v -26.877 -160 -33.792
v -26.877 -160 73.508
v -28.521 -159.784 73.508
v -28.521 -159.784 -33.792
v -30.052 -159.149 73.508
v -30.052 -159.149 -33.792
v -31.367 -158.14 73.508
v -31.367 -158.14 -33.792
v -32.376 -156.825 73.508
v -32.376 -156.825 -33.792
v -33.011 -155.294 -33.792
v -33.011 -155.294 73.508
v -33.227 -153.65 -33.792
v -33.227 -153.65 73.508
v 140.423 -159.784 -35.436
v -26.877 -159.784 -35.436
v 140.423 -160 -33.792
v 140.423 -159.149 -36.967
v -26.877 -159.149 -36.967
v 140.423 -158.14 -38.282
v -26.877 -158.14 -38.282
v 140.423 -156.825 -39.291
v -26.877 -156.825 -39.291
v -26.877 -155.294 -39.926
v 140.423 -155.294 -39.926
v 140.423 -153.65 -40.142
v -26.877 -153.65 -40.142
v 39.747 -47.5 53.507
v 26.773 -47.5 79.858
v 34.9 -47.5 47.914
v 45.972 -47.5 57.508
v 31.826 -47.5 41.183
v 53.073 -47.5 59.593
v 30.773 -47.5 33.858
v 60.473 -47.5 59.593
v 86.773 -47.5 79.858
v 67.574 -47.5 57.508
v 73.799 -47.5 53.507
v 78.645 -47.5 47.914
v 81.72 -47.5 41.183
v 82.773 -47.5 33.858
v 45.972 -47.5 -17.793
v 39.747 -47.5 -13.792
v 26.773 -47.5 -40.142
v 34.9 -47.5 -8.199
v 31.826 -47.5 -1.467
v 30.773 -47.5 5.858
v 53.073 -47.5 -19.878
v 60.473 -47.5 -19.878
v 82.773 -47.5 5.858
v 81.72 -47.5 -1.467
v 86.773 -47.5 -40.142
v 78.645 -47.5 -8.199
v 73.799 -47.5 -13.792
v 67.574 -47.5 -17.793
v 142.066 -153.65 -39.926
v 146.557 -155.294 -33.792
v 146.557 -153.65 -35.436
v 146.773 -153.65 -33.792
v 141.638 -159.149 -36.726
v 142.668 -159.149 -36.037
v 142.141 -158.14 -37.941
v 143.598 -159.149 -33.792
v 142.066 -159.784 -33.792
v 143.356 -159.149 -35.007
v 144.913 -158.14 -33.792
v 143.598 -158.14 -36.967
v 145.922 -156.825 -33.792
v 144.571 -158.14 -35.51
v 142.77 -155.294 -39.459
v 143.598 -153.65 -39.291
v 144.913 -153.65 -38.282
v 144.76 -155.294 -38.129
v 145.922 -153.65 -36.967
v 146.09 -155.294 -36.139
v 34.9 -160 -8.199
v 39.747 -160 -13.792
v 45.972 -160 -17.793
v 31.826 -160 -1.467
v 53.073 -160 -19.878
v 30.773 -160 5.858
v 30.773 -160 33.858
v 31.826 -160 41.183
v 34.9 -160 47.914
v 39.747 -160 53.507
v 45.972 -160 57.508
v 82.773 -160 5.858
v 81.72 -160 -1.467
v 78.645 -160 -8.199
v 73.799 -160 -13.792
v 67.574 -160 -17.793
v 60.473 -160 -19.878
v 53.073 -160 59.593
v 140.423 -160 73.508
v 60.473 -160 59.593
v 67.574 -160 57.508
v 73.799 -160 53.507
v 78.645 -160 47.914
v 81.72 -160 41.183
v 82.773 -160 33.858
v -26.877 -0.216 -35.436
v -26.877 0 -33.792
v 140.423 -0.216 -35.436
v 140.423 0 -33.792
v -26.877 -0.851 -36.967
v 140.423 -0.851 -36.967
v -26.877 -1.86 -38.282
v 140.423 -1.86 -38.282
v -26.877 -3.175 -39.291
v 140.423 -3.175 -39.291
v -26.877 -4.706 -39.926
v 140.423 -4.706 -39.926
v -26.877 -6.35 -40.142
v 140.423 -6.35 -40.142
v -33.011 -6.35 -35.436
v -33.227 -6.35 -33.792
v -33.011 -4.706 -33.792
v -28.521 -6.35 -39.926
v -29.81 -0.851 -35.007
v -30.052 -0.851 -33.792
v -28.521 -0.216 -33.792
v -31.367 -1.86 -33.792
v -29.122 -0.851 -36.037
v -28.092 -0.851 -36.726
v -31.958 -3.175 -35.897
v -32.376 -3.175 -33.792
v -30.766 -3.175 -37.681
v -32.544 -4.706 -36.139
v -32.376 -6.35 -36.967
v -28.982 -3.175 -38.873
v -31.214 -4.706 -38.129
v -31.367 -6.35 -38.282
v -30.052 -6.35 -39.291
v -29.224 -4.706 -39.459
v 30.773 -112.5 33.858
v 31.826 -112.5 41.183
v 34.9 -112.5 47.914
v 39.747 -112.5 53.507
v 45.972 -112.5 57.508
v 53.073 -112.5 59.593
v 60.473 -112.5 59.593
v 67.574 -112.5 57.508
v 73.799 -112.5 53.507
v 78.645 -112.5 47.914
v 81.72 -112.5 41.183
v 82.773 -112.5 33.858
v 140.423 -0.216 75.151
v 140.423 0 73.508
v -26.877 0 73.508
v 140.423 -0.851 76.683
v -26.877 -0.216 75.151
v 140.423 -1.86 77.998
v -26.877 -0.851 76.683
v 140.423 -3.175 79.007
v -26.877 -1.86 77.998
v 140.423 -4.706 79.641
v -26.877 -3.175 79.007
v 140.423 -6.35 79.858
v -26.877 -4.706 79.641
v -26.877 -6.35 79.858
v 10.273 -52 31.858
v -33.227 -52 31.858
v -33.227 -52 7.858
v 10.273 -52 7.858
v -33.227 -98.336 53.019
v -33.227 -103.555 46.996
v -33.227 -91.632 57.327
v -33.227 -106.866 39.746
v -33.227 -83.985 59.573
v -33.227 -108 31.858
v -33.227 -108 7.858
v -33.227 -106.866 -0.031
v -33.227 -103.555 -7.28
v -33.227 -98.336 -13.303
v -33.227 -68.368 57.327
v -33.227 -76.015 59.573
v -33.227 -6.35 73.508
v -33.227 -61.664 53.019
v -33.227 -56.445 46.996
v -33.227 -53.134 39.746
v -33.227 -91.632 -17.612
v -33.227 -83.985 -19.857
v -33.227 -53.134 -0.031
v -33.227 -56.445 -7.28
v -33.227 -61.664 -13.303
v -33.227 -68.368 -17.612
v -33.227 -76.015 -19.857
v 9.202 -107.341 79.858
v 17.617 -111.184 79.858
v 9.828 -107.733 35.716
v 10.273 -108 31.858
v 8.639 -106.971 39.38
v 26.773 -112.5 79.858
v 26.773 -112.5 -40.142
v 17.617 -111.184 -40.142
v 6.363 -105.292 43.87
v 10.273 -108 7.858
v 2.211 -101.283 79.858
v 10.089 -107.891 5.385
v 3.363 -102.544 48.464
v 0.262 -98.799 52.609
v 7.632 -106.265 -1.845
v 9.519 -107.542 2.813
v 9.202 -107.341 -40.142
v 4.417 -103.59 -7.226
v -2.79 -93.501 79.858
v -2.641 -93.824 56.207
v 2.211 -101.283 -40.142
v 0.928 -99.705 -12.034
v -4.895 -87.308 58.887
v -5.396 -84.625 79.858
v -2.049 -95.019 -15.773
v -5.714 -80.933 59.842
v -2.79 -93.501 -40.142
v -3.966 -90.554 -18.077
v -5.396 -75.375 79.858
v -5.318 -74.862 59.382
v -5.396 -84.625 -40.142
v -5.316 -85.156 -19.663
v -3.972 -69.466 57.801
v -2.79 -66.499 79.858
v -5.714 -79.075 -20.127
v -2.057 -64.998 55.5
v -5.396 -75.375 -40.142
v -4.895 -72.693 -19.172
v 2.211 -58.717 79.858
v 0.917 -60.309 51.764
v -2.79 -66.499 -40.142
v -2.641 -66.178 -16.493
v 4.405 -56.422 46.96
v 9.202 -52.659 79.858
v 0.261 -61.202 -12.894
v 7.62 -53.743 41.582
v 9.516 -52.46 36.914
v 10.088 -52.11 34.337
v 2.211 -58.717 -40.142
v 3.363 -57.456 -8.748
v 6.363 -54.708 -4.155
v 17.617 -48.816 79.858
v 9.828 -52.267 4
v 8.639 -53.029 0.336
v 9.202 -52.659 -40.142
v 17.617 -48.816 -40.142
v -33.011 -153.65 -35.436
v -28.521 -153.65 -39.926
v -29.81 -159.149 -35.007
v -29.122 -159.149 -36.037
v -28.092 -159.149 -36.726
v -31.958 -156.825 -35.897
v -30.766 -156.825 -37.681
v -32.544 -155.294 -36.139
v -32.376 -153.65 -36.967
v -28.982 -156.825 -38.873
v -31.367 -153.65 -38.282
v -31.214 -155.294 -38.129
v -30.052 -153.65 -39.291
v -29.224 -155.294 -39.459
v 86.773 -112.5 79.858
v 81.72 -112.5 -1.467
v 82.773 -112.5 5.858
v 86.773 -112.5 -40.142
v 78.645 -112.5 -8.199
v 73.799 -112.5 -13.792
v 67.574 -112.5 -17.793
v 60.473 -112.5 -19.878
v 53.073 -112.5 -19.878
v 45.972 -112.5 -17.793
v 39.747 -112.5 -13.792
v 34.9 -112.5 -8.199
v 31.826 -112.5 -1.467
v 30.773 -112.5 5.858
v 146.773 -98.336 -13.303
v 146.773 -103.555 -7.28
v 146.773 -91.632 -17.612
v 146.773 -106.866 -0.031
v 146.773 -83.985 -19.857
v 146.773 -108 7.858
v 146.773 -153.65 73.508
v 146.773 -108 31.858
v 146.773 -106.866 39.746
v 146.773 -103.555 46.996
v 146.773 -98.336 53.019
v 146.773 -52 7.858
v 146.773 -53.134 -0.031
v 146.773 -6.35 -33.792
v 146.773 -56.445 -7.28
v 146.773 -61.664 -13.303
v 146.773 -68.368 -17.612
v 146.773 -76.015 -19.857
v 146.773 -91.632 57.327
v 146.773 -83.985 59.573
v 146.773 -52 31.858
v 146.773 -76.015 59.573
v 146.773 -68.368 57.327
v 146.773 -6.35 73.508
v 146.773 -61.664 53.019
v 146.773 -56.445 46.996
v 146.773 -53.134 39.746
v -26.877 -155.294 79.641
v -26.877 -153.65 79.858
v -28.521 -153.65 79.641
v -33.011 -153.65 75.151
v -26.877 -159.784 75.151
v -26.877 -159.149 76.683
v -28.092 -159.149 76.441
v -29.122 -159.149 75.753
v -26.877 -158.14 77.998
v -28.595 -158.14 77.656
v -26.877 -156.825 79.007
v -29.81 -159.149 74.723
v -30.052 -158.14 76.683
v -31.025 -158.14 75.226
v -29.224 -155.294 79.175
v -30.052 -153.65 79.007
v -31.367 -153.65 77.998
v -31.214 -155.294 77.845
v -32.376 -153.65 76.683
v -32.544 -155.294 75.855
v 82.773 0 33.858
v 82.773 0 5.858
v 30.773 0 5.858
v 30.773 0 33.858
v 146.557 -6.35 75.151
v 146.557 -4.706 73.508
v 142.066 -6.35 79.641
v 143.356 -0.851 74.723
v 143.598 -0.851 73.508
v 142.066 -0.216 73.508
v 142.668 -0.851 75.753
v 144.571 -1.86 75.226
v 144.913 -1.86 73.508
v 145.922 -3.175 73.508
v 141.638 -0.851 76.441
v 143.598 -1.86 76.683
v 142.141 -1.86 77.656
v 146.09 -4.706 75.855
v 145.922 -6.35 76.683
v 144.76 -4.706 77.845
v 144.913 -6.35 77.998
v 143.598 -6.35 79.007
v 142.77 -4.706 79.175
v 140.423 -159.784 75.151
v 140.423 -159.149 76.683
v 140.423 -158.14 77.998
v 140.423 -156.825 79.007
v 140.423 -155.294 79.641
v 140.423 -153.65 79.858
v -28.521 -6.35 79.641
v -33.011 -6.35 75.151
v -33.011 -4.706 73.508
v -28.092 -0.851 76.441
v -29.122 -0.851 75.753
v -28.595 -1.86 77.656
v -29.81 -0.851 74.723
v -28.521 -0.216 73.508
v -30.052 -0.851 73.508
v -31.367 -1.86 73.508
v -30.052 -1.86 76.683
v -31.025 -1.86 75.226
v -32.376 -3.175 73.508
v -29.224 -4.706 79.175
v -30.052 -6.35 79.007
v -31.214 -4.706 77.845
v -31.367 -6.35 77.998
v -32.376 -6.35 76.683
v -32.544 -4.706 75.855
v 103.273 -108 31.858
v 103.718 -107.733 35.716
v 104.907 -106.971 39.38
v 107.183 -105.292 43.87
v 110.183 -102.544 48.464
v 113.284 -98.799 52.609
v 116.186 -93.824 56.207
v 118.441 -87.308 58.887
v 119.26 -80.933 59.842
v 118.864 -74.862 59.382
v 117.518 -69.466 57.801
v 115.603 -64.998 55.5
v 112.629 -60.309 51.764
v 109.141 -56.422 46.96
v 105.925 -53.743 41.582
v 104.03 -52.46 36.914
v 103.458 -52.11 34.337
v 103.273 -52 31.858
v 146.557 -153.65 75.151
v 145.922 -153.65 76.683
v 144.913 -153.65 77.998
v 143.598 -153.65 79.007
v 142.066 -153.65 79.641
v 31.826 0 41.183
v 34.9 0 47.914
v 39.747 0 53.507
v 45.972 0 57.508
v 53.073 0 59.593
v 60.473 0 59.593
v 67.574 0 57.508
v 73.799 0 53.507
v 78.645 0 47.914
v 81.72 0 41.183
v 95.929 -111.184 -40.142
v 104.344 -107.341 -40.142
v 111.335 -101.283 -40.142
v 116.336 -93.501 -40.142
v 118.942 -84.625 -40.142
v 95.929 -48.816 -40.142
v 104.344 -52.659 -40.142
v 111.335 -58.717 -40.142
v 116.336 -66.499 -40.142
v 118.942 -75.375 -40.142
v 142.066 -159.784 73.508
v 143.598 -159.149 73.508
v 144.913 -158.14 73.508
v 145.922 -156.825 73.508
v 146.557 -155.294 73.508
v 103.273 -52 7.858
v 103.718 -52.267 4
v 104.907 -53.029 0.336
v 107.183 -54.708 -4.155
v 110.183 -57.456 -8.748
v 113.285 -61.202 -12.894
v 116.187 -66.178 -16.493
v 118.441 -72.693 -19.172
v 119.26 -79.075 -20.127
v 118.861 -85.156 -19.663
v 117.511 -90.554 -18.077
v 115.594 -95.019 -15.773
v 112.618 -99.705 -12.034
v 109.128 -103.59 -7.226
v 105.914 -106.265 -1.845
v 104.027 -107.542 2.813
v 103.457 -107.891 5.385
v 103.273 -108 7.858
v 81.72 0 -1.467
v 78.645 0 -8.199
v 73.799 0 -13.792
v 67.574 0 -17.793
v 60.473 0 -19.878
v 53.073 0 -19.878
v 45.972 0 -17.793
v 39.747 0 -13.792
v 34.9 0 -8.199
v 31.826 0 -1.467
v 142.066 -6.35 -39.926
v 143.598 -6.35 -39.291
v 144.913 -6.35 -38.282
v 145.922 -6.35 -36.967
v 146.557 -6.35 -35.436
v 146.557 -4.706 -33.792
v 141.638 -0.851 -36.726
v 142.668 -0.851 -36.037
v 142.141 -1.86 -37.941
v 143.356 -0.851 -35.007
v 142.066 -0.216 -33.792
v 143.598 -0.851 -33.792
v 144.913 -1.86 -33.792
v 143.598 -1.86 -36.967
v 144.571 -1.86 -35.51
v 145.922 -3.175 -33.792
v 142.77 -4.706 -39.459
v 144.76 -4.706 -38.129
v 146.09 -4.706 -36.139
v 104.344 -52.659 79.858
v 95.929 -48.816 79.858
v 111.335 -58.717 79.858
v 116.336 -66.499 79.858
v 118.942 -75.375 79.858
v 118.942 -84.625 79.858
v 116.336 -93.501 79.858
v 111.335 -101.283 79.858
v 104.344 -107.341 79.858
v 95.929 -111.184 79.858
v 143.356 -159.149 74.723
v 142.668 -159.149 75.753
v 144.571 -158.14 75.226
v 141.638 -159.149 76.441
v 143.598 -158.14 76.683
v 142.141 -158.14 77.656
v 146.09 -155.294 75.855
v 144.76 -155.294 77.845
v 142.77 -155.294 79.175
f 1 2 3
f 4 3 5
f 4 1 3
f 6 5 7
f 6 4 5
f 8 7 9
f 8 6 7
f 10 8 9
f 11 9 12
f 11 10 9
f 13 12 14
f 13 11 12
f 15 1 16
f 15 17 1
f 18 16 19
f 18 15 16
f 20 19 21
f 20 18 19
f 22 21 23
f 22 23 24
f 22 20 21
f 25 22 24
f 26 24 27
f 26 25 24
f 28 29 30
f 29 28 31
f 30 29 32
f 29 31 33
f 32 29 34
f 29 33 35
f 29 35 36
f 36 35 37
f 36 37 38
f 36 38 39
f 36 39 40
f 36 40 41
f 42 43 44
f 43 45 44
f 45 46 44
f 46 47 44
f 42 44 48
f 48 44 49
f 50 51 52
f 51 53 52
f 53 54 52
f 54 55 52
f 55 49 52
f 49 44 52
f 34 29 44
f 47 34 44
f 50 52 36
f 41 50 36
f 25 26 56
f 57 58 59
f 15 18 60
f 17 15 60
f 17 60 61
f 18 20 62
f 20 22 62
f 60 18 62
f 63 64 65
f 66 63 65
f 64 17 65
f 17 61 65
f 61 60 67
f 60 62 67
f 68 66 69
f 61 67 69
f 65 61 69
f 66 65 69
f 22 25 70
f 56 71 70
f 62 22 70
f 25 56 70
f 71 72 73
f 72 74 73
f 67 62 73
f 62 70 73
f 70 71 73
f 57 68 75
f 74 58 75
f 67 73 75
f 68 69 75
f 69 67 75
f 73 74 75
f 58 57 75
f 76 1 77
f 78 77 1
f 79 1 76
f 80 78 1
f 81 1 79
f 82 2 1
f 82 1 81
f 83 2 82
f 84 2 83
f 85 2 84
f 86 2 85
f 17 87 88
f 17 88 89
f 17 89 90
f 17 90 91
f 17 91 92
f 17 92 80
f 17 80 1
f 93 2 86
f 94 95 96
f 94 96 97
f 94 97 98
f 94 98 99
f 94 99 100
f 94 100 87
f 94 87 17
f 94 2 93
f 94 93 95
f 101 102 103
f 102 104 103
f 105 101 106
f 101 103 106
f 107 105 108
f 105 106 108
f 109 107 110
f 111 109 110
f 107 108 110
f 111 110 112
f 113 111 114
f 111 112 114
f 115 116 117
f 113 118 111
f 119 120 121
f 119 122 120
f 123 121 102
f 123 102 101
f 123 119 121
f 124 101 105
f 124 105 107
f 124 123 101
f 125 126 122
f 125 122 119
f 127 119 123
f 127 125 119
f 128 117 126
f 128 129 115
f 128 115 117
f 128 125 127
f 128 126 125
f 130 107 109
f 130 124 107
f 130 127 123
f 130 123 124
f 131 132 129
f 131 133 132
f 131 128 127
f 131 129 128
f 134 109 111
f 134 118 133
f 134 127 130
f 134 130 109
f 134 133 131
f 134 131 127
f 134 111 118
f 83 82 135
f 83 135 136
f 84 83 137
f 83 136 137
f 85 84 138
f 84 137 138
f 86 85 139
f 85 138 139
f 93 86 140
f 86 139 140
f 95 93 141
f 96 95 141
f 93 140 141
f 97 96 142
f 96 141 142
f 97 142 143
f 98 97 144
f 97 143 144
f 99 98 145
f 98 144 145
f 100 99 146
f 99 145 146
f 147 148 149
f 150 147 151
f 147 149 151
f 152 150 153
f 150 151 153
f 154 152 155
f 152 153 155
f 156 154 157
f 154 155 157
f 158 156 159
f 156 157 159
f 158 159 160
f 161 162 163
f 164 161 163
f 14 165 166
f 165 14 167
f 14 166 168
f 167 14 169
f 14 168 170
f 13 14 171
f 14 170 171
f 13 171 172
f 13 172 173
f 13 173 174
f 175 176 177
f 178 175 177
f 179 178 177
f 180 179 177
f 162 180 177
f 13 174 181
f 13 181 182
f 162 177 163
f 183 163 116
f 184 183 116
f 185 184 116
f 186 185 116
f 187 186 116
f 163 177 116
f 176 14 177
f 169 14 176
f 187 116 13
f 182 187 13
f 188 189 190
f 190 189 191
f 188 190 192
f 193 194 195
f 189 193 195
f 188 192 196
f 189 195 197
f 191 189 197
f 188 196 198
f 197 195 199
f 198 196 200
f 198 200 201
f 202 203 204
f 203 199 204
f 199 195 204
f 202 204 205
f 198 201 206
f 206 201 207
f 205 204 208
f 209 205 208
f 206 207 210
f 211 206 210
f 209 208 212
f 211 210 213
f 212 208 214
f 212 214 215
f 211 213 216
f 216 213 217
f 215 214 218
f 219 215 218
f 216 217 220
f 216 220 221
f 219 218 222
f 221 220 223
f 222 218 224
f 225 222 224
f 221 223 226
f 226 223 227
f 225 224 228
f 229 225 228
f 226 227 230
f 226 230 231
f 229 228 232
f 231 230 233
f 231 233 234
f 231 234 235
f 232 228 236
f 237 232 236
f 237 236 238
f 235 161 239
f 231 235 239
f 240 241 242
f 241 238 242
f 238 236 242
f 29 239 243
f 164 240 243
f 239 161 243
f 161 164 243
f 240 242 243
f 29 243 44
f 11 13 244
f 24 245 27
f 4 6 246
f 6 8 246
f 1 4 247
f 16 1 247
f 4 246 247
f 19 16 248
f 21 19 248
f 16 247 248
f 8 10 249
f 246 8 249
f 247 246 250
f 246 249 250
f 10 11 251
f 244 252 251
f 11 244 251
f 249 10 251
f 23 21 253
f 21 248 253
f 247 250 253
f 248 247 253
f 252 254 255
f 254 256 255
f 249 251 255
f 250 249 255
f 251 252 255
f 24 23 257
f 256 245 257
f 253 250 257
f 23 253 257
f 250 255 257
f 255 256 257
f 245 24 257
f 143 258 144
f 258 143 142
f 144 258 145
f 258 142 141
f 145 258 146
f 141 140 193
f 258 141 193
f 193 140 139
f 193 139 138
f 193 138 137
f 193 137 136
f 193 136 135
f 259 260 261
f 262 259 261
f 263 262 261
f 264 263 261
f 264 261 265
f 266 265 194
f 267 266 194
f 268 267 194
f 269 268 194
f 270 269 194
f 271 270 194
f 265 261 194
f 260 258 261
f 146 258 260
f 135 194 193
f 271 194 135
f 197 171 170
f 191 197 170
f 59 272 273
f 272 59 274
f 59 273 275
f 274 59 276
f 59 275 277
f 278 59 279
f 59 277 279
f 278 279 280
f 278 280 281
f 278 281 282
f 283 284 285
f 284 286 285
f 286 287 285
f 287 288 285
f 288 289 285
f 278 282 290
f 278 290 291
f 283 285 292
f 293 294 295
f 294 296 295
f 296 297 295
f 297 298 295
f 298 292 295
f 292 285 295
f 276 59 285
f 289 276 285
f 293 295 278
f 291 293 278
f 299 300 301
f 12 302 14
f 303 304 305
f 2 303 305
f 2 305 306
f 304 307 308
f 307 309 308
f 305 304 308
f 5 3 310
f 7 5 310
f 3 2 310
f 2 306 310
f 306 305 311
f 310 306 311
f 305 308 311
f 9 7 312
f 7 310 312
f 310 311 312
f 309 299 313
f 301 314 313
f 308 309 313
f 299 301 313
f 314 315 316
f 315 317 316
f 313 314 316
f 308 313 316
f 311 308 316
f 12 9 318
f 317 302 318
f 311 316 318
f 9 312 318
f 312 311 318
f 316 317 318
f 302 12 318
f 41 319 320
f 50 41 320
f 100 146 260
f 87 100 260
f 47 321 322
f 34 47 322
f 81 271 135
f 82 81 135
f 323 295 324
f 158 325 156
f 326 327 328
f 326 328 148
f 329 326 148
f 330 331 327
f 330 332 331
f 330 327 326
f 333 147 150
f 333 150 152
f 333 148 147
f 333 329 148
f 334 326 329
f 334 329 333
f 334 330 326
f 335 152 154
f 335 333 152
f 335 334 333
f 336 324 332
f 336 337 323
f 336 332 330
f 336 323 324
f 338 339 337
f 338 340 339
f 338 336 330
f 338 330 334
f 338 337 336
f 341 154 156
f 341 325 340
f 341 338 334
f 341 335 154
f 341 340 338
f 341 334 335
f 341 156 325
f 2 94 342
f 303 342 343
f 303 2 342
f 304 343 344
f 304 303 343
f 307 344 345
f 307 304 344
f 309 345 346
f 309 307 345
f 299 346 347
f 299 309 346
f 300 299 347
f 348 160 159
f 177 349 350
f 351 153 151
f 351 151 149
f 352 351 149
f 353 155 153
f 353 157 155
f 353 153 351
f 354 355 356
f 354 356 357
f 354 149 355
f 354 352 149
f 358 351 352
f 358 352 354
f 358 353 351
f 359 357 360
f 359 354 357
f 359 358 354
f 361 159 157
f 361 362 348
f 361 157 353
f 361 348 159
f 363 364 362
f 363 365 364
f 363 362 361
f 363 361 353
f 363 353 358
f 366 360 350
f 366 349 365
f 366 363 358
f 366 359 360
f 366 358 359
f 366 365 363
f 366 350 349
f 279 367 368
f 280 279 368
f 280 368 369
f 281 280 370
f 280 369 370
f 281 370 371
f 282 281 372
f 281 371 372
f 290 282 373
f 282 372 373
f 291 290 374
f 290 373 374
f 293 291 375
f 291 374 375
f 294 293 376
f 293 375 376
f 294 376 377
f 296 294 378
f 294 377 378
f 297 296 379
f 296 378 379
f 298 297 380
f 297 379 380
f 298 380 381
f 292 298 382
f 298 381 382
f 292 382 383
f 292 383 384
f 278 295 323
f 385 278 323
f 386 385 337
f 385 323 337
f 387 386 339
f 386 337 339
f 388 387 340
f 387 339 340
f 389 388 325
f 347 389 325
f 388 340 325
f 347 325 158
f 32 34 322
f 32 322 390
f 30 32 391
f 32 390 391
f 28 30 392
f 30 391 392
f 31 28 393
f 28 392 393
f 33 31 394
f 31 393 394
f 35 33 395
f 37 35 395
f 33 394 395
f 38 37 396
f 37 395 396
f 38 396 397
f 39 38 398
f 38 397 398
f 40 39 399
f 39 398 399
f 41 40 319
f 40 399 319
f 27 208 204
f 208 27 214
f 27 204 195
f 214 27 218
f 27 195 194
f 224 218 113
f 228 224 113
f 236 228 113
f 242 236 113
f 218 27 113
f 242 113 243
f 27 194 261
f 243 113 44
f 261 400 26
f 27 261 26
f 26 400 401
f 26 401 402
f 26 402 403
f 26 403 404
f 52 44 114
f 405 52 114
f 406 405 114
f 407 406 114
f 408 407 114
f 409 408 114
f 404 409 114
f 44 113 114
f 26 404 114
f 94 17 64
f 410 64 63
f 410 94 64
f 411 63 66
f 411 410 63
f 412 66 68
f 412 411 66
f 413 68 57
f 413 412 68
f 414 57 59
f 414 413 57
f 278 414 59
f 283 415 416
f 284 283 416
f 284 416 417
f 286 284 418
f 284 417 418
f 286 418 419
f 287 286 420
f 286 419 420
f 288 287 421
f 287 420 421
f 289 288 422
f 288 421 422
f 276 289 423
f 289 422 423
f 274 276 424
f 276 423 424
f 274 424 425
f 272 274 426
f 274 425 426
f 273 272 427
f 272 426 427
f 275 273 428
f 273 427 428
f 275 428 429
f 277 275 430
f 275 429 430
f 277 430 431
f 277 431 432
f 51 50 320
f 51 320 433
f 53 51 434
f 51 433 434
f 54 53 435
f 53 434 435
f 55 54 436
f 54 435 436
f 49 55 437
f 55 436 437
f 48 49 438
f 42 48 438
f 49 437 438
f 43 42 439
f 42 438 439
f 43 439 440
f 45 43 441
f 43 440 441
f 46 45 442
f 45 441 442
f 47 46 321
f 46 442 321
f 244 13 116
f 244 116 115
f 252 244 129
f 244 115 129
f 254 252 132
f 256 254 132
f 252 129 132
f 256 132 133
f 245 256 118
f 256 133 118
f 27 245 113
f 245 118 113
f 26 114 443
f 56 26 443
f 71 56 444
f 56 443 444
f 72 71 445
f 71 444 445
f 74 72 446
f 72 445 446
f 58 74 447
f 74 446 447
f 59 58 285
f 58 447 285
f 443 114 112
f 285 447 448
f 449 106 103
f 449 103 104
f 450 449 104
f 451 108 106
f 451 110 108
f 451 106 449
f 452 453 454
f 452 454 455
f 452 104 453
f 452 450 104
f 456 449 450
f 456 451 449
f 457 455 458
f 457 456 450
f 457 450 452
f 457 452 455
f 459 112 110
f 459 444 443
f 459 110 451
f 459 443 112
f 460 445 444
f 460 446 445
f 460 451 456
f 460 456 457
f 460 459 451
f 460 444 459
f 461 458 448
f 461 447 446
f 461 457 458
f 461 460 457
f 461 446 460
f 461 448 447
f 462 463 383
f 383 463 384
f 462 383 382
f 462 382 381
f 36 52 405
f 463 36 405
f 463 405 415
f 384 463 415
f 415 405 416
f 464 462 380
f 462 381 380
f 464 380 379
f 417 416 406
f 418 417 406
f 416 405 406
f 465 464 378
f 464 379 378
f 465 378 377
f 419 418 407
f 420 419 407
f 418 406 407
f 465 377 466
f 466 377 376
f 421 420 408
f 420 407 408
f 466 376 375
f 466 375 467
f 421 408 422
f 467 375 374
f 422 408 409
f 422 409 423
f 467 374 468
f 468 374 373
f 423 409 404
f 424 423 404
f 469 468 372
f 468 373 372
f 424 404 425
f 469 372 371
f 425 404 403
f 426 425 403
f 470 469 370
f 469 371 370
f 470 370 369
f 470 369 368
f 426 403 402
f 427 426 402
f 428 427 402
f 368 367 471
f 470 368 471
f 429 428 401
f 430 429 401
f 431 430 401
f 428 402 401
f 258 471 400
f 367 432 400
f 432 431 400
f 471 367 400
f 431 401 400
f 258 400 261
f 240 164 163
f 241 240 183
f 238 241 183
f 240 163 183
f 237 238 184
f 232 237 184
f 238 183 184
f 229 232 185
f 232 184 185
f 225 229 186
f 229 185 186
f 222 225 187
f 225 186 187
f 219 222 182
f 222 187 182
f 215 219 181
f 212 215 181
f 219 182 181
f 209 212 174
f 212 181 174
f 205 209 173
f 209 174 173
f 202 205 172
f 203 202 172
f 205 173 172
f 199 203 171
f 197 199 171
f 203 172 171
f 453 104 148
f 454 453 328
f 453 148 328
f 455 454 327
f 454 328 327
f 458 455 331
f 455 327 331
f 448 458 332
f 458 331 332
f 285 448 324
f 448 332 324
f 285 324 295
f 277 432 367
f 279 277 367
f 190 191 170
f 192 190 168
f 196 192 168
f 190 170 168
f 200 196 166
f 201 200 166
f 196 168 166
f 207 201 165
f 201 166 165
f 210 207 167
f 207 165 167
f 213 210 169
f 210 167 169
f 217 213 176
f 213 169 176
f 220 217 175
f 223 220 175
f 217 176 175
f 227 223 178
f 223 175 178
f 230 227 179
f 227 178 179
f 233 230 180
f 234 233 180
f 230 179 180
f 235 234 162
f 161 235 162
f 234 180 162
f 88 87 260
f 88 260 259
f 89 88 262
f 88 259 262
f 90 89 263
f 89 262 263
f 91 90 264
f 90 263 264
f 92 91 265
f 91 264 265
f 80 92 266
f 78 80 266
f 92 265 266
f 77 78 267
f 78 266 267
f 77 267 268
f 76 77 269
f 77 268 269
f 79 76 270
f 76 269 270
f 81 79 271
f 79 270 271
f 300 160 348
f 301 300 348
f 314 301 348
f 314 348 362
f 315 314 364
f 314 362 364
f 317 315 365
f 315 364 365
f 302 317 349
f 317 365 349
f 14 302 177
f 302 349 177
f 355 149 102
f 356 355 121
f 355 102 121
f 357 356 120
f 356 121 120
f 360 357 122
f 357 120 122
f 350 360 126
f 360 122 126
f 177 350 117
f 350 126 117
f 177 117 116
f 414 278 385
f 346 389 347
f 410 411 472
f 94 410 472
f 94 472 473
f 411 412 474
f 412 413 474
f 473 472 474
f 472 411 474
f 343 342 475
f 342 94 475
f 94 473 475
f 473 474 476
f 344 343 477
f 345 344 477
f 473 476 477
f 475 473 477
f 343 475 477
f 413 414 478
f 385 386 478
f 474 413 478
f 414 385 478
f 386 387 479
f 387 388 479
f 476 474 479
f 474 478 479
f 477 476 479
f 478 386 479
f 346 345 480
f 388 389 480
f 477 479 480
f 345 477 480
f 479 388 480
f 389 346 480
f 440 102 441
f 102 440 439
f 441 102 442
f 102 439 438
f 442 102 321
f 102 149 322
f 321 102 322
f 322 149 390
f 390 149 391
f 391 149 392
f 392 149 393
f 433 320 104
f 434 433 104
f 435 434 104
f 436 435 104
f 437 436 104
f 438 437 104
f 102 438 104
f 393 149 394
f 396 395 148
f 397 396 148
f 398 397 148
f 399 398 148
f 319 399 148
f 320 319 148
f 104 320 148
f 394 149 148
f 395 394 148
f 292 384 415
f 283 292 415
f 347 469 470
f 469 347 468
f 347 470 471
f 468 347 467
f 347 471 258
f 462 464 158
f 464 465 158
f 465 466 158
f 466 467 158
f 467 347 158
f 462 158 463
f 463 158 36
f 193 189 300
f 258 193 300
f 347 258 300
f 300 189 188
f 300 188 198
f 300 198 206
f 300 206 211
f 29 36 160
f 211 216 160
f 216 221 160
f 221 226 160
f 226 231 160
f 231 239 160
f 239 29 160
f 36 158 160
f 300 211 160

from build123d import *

# Parameters (mm, degrees)
F1_DEPTH = 160
F3_DEPTH = 120
F5_DEPTH = 180
F6_R     = 6.35
F7_R     = 6.35


with BuildPart() as f1:
    # F0 (on Front) → F1 (new body)
    with BuildSketch(Plane.XZ):
        with BuildLine():
            Line((140.422905, 79.857803), (-26.877095, 79.857803))
            ThreePointArc((-26.877095, 79.857803), (-31.367223, 77.997931), (-33.227095, 73.507803))
            Line((-33.227095, 73.507803), (-33.227095, -33.792197))
            ThreePointArc((-33.227095, -33.792197), (-31.367223, -38.282325), (-26.877095, -40.142197))
            Line((-26.877095, -40.142197), (140.422905, -40.142197))
            ThreePointArc((140.422905, -40.142197), (144.913033, -38.282325), (146.772905, -33.792197))
            Line((146.772905, -33.792197), (146.772905, 73.507803))
            ThreePointArc((146.772905, 73.507803), (144.913033, 77.997931), (140.422905, 79.857803))
        make_face()
        with BuildLine():
            Line((30.772905, 5.857803), (30.772905, 33.857803))
            ThreePointArc((30.772905, 33.857803), (56.772905, 59.857803), (82.772905, 33.857803))
            Line((82.772905, 33.857803), (82.772905, 5.857803))
            ThreePointArc((82.772905, 5.857803), (56.772905, -20.142197), (30.772905, 5.857803))
        make_face(mode=Mode.SUBTRACT)
    extrude(amount=F1_DEPTH)

    # F2 (on face) → F3 (cut)
    with BuildSketch(Plane(origin=(0, 0, -40.142197), x_dir=(1, 0, 0), z_dir=(0, 0, -1))):
        with BuildLine():
            Line((26.772905, 47.5), (86.772905, 47.5))
            ThreePointArc((86.772905, 47.5), (119.272905, 80), (86.772905, 112.5))
            Line((86.772905, 112.5), (26.772905, 112.5))
            ThreePointArc((26.772905, 112.5), (-5.727095, 80), (26.772905, 47.5))
        make_face()
    extrude(amount=-F3_DEPTH, mode=Mode.SUBTRACT)

    # F4 (on face) → F5 (cut)
    with BuildSketch(Plane(origin=(-33.227095, 0, 0), x_dir=(0, -1, 0), z_dir=(-1, 0, 0))):
        with BuildLine():
            ThreePointArc((108, 31.857803), (80, 59.857803), (52, 31.857803))
            Line((52, 31.857803), (52, 7.857803))
            ThreePointArc((52, 7.857803), (80, -20.142197), (108, 7.857803))
            Line((108, 7.857803), (108, 31.857803))
        make_face()
    extrude(amount=-F5_DEPTH, mode=Mode.SUBTRACT)

    # F6
    f6_edges = [f1.edges().sort_by_distance(p)[0] for p in [
        (56.772905, 0, -40.142197),
        (140.422905, -80, -40.142197),
    ]]
    fillet(f6_edges, radius=F6_R)

    # F7
    f7_edges = [f1.edges().sort_by_distance(p)[0] for p in [
        (56.772905, -160, -40.142197),
        (-26.877095, -83.175, -40.142197),
    ]]
    fillet(f7_edges, radius=F7_R)


solid = f1.part
